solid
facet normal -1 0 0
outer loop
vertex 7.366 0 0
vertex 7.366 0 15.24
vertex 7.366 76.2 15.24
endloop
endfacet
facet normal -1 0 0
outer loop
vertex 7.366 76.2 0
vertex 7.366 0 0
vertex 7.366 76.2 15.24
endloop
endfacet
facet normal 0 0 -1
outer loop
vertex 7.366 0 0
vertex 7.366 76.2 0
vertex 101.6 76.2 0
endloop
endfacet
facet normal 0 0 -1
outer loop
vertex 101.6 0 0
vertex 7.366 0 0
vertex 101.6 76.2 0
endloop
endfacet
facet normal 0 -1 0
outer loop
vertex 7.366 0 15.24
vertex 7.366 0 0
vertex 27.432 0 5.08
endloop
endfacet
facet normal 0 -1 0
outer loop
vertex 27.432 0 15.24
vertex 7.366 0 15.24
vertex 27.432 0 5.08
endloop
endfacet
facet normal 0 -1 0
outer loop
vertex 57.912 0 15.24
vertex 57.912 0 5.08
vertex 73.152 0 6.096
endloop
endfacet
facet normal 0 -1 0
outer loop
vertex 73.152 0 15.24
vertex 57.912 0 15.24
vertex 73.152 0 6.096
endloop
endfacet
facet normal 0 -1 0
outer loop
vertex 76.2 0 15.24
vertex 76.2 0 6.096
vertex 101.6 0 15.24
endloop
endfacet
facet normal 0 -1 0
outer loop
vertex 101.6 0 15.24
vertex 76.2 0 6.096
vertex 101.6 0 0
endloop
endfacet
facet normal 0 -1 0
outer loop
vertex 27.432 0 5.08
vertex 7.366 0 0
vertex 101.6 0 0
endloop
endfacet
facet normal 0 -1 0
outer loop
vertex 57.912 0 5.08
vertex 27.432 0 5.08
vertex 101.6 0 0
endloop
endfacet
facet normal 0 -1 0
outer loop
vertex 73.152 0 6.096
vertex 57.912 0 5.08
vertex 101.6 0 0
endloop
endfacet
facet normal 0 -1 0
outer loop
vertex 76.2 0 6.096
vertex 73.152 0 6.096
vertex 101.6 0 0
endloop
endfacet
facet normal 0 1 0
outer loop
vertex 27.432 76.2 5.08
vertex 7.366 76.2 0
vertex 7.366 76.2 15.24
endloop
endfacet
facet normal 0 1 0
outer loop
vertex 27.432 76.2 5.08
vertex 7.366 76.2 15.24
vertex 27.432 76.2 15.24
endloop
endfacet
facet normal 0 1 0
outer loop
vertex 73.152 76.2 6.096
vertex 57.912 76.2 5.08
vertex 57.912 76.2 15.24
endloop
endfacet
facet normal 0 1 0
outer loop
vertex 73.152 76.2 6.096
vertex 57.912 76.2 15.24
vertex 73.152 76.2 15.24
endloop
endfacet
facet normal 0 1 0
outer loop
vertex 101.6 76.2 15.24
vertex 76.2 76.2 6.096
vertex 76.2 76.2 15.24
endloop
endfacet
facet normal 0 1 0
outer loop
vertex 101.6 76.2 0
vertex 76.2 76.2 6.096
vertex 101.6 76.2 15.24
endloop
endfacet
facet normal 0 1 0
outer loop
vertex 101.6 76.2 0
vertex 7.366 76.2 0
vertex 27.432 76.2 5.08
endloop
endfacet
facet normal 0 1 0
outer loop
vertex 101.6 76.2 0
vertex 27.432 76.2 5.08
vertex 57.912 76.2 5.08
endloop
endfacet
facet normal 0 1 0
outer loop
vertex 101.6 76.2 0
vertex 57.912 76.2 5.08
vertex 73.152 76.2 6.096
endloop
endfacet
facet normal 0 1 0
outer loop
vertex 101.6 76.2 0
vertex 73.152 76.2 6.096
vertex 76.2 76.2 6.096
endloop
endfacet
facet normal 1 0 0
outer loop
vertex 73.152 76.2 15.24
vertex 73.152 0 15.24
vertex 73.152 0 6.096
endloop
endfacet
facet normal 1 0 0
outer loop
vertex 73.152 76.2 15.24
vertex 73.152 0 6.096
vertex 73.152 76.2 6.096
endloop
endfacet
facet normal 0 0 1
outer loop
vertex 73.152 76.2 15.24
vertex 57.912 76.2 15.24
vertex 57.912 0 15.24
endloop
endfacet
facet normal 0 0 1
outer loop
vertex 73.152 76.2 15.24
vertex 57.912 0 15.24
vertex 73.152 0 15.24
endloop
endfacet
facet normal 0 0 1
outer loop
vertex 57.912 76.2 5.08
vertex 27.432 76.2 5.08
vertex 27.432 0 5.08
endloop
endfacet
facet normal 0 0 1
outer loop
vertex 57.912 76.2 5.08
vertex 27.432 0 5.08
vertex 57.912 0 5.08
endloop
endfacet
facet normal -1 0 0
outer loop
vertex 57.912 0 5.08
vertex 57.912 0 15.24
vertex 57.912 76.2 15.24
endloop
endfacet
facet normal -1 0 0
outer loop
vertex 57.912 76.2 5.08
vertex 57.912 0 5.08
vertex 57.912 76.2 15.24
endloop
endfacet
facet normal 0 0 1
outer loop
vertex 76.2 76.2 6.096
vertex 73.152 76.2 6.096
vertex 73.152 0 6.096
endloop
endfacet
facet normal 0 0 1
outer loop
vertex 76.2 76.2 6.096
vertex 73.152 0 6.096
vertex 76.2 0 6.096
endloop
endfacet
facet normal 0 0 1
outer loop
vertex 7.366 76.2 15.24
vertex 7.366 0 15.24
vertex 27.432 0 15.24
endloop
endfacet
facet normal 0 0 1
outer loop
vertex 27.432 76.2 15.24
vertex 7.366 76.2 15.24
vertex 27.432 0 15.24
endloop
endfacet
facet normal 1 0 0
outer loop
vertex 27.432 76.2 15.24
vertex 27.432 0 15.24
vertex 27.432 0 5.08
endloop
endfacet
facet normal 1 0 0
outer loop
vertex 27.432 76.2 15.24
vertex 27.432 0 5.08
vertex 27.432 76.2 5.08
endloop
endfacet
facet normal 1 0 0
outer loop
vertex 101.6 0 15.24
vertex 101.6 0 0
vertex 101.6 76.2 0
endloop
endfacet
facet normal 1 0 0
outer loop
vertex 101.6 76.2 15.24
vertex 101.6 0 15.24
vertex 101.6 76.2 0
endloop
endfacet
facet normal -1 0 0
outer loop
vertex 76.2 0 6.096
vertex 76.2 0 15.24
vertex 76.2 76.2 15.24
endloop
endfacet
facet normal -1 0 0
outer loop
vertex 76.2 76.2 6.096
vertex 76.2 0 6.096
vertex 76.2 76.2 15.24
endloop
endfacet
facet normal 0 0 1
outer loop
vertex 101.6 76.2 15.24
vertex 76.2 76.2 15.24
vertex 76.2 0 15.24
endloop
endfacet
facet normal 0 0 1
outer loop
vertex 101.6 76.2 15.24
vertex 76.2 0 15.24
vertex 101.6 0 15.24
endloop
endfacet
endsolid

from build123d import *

# Parameters (mm, degrees)
F0_W     = 101.6
F0_H     = 76.2
F1_DEPTH = 15.24
F2_W     = 3.048
F2_H     = 76.2
F3_DEPTH = 9.144
F4_W     = 30.48
F4_H     = 76.2
F5_DEPTH = 10.16
F6_W     = 7.366
F6_H     = 76.2
F7_DEPTH = 17.78


with BuildPart() as f1:
    # F0 (on Top) → F1 (new body)
    with BuildSketch(Plane.XY):
        with Locations((50.8, 38.1)):
            Rectangle(F0_W, F0_H)
    extrude(amount=F1_DEPTH)

    # F2 (on face) → F3 (cut)
    with BuildSketch(Plane.XY.offset(15.24)):
        with Locations((74.676, 38.1)):
            Rectangle(F2_W, F2_H)
    extrude(amount=-F3_DEPTH, mode=Mode.SUBTRACT)

    # F4 (on face) → F5 (cut)
    with BuildSketch(Plane.XY.offset(15.24)):
        with Locations((42.672, 38.1)):
            Rectangle(F4_W, F4_H)
    extrude(amount=-F5_DEPTH, mode=Mode.SUBTRACT)

    # F6 (on face) → F7 (cut)
    with BuildSketch(Plane.XY.offset(15.24)):
        with Locations((3.683, 38.1)):
            Rectangle(F6_W, F6_H)
    extrude(amount=-F7_DEPTH, mode=Mode.SUBTRACT)


solid = f1.part
